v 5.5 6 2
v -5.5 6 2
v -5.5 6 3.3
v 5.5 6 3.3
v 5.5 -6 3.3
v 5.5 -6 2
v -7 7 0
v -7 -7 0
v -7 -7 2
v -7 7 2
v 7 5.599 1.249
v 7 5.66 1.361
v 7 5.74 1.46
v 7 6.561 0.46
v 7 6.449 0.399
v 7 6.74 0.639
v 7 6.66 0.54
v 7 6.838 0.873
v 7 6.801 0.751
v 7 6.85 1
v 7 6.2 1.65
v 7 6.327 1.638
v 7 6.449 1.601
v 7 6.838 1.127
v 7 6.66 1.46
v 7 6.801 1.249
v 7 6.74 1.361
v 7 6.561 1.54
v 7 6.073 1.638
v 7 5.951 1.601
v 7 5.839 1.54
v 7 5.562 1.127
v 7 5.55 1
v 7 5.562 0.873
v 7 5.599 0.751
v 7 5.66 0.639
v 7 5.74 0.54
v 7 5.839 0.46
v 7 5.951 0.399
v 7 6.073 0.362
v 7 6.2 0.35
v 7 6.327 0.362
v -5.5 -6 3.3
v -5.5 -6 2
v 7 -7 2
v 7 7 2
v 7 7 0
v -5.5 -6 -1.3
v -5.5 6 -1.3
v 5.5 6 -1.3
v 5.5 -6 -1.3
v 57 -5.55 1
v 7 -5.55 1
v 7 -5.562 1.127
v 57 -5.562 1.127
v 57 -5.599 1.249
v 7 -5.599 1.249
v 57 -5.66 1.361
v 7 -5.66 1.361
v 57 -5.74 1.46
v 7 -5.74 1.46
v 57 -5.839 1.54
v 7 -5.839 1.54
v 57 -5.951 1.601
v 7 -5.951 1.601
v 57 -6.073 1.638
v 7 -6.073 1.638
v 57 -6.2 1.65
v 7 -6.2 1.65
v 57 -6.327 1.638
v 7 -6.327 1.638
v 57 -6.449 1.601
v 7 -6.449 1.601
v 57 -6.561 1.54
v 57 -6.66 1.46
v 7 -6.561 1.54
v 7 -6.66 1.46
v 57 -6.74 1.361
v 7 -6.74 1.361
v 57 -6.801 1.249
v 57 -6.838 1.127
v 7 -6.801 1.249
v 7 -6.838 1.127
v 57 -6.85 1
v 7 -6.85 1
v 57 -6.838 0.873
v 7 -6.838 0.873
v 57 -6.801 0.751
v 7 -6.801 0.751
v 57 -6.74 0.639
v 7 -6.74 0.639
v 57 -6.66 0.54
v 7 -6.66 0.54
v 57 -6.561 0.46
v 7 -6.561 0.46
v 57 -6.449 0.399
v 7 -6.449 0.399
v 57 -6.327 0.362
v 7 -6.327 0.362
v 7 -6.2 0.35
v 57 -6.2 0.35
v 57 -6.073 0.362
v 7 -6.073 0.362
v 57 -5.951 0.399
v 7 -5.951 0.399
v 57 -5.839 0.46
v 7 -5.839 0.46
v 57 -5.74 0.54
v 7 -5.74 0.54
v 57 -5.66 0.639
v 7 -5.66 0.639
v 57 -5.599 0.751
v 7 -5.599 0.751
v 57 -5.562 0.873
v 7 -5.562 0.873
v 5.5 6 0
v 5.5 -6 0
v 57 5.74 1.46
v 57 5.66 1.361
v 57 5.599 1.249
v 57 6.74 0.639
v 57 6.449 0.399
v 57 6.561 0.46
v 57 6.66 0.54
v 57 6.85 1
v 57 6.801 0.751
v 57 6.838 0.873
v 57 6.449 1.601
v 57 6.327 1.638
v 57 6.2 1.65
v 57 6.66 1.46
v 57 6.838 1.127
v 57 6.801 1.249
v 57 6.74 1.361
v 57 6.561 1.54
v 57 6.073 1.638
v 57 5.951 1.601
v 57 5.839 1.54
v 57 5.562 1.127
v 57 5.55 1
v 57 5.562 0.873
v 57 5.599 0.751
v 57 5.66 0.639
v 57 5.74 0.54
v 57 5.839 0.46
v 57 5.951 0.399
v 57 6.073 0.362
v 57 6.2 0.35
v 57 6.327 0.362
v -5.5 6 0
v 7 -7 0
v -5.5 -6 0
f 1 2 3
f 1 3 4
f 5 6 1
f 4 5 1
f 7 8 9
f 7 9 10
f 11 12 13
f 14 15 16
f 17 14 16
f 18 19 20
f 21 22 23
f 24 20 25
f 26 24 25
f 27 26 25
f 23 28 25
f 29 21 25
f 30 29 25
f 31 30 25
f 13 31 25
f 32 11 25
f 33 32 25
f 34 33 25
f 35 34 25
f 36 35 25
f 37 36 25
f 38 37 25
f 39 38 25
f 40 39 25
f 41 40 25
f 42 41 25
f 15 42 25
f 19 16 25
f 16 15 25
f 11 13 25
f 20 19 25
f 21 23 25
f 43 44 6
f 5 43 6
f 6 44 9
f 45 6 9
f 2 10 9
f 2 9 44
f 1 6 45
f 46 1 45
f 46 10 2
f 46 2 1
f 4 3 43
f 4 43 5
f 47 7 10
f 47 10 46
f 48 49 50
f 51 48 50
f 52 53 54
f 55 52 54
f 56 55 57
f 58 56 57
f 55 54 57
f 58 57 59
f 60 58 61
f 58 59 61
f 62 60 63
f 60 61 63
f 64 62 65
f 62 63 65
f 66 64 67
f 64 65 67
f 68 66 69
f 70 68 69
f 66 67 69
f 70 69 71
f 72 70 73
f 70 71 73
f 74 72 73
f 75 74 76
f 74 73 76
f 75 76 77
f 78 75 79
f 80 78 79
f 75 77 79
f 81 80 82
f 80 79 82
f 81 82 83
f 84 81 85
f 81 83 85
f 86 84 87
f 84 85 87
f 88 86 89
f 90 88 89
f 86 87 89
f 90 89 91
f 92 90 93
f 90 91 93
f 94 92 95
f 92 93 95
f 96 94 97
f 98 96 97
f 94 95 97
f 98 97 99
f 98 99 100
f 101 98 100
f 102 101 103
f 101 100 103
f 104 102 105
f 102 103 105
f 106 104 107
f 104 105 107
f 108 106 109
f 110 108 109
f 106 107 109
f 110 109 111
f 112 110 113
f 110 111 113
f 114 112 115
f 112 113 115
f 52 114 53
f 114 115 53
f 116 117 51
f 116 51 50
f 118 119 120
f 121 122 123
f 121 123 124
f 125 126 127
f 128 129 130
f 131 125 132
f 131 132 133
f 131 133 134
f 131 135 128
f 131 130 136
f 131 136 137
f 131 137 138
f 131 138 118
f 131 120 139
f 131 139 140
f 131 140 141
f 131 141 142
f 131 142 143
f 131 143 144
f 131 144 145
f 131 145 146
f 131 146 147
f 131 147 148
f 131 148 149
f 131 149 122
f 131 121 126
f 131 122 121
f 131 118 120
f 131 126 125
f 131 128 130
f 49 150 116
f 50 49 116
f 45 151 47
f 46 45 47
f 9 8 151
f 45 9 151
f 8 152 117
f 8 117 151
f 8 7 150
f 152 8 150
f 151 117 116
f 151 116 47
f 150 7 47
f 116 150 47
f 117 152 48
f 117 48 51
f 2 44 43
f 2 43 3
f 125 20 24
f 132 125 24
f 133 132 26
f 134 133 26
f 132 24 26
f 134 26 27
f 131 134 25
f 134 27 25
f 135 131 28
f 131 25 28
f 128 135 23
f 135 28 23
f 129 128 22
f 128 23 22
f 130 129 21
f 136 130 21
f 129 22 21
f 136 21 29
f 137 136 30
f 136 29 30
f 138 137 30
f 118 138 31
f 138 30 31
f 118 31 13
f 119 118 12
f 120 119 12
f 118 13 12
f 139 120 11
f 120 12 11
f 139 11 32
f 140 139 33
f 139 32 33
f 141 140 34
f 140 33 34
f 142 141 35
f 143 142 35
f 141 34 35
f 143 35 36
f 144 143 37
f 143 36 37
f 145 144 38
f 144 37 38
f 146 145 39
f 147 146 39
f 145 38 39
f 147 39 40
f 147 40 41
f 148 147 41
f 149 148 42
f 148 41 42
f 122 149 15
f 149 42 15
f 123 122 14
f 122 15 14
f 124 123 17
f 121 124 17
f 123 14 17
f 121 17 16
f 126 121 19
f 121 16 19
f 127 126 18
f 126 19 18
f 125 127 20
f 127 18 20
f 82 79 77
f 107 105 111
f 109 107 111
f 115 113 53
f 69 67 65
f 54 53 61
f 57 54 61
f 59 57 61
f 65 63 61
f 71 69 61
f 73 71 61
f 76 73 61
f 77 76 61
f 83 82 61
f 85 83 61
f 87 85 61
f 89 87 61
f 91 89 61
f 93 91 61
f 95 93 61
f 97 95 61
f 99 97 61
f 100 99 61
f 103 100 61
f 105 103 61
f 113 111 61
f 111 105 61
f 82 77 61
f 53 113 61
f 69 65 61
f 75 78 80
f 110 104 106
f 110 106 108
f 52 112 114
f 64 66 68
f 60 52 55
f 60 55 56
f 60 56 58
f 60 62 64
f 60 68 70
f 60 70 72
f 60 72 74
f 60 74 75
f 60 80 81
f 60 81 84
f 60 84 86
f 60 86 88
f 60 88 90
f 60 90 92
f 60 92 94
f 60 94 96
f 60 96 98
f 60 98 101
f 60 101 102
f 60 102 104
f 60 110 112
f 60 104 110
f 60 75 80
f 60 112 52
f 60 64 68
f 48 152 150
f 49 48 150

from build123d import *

# Parameters (mm, degrees)
F0_W     = 11
F0_H     = 12
F1_DEPTH = 1.3
F2_W     = 14
F2_H     = 14
F3_DEPTH = 2
F4_W     = 11
F4_H     = 12
F5_DEPTH = 1.3
F6_R     = 0.65
F7_DEPTH = 50


with BuildPart() as f1:
    # F0 (on Top) → F1 (new body)
    with BuildSketch(Plane.XY):
        Rectangle(F0_W, F0_H)
    extrude(amount=-F1_DEPTH)

    # F2 (on face) → F3 (join)
    with BuildSketch(Plane.XY):
        Rectangle(F2_W, F2_H)
    extrude(amount=F3_DEPTH)

    # F4 (on face) → F5 (join)
    with BuildSketch(Plane.XY.offset(2)):
        Rectangle(F4_W, F4_H)
    extrude(amount=F5_DEPTH)


with BuildPart() as f7:
    # F6 (on face) → F7 (new body)
    with BuildSketch(Plane.YZ.offset(7)):
        with Locations((-6.2, 1)):
            Circle(F6_R)
        with Locations((6.2, 1)):
            Circle(F6_R)
    extrude(amount=F7_DEPTH)


solid = Compound([f1.part, f7.part])
